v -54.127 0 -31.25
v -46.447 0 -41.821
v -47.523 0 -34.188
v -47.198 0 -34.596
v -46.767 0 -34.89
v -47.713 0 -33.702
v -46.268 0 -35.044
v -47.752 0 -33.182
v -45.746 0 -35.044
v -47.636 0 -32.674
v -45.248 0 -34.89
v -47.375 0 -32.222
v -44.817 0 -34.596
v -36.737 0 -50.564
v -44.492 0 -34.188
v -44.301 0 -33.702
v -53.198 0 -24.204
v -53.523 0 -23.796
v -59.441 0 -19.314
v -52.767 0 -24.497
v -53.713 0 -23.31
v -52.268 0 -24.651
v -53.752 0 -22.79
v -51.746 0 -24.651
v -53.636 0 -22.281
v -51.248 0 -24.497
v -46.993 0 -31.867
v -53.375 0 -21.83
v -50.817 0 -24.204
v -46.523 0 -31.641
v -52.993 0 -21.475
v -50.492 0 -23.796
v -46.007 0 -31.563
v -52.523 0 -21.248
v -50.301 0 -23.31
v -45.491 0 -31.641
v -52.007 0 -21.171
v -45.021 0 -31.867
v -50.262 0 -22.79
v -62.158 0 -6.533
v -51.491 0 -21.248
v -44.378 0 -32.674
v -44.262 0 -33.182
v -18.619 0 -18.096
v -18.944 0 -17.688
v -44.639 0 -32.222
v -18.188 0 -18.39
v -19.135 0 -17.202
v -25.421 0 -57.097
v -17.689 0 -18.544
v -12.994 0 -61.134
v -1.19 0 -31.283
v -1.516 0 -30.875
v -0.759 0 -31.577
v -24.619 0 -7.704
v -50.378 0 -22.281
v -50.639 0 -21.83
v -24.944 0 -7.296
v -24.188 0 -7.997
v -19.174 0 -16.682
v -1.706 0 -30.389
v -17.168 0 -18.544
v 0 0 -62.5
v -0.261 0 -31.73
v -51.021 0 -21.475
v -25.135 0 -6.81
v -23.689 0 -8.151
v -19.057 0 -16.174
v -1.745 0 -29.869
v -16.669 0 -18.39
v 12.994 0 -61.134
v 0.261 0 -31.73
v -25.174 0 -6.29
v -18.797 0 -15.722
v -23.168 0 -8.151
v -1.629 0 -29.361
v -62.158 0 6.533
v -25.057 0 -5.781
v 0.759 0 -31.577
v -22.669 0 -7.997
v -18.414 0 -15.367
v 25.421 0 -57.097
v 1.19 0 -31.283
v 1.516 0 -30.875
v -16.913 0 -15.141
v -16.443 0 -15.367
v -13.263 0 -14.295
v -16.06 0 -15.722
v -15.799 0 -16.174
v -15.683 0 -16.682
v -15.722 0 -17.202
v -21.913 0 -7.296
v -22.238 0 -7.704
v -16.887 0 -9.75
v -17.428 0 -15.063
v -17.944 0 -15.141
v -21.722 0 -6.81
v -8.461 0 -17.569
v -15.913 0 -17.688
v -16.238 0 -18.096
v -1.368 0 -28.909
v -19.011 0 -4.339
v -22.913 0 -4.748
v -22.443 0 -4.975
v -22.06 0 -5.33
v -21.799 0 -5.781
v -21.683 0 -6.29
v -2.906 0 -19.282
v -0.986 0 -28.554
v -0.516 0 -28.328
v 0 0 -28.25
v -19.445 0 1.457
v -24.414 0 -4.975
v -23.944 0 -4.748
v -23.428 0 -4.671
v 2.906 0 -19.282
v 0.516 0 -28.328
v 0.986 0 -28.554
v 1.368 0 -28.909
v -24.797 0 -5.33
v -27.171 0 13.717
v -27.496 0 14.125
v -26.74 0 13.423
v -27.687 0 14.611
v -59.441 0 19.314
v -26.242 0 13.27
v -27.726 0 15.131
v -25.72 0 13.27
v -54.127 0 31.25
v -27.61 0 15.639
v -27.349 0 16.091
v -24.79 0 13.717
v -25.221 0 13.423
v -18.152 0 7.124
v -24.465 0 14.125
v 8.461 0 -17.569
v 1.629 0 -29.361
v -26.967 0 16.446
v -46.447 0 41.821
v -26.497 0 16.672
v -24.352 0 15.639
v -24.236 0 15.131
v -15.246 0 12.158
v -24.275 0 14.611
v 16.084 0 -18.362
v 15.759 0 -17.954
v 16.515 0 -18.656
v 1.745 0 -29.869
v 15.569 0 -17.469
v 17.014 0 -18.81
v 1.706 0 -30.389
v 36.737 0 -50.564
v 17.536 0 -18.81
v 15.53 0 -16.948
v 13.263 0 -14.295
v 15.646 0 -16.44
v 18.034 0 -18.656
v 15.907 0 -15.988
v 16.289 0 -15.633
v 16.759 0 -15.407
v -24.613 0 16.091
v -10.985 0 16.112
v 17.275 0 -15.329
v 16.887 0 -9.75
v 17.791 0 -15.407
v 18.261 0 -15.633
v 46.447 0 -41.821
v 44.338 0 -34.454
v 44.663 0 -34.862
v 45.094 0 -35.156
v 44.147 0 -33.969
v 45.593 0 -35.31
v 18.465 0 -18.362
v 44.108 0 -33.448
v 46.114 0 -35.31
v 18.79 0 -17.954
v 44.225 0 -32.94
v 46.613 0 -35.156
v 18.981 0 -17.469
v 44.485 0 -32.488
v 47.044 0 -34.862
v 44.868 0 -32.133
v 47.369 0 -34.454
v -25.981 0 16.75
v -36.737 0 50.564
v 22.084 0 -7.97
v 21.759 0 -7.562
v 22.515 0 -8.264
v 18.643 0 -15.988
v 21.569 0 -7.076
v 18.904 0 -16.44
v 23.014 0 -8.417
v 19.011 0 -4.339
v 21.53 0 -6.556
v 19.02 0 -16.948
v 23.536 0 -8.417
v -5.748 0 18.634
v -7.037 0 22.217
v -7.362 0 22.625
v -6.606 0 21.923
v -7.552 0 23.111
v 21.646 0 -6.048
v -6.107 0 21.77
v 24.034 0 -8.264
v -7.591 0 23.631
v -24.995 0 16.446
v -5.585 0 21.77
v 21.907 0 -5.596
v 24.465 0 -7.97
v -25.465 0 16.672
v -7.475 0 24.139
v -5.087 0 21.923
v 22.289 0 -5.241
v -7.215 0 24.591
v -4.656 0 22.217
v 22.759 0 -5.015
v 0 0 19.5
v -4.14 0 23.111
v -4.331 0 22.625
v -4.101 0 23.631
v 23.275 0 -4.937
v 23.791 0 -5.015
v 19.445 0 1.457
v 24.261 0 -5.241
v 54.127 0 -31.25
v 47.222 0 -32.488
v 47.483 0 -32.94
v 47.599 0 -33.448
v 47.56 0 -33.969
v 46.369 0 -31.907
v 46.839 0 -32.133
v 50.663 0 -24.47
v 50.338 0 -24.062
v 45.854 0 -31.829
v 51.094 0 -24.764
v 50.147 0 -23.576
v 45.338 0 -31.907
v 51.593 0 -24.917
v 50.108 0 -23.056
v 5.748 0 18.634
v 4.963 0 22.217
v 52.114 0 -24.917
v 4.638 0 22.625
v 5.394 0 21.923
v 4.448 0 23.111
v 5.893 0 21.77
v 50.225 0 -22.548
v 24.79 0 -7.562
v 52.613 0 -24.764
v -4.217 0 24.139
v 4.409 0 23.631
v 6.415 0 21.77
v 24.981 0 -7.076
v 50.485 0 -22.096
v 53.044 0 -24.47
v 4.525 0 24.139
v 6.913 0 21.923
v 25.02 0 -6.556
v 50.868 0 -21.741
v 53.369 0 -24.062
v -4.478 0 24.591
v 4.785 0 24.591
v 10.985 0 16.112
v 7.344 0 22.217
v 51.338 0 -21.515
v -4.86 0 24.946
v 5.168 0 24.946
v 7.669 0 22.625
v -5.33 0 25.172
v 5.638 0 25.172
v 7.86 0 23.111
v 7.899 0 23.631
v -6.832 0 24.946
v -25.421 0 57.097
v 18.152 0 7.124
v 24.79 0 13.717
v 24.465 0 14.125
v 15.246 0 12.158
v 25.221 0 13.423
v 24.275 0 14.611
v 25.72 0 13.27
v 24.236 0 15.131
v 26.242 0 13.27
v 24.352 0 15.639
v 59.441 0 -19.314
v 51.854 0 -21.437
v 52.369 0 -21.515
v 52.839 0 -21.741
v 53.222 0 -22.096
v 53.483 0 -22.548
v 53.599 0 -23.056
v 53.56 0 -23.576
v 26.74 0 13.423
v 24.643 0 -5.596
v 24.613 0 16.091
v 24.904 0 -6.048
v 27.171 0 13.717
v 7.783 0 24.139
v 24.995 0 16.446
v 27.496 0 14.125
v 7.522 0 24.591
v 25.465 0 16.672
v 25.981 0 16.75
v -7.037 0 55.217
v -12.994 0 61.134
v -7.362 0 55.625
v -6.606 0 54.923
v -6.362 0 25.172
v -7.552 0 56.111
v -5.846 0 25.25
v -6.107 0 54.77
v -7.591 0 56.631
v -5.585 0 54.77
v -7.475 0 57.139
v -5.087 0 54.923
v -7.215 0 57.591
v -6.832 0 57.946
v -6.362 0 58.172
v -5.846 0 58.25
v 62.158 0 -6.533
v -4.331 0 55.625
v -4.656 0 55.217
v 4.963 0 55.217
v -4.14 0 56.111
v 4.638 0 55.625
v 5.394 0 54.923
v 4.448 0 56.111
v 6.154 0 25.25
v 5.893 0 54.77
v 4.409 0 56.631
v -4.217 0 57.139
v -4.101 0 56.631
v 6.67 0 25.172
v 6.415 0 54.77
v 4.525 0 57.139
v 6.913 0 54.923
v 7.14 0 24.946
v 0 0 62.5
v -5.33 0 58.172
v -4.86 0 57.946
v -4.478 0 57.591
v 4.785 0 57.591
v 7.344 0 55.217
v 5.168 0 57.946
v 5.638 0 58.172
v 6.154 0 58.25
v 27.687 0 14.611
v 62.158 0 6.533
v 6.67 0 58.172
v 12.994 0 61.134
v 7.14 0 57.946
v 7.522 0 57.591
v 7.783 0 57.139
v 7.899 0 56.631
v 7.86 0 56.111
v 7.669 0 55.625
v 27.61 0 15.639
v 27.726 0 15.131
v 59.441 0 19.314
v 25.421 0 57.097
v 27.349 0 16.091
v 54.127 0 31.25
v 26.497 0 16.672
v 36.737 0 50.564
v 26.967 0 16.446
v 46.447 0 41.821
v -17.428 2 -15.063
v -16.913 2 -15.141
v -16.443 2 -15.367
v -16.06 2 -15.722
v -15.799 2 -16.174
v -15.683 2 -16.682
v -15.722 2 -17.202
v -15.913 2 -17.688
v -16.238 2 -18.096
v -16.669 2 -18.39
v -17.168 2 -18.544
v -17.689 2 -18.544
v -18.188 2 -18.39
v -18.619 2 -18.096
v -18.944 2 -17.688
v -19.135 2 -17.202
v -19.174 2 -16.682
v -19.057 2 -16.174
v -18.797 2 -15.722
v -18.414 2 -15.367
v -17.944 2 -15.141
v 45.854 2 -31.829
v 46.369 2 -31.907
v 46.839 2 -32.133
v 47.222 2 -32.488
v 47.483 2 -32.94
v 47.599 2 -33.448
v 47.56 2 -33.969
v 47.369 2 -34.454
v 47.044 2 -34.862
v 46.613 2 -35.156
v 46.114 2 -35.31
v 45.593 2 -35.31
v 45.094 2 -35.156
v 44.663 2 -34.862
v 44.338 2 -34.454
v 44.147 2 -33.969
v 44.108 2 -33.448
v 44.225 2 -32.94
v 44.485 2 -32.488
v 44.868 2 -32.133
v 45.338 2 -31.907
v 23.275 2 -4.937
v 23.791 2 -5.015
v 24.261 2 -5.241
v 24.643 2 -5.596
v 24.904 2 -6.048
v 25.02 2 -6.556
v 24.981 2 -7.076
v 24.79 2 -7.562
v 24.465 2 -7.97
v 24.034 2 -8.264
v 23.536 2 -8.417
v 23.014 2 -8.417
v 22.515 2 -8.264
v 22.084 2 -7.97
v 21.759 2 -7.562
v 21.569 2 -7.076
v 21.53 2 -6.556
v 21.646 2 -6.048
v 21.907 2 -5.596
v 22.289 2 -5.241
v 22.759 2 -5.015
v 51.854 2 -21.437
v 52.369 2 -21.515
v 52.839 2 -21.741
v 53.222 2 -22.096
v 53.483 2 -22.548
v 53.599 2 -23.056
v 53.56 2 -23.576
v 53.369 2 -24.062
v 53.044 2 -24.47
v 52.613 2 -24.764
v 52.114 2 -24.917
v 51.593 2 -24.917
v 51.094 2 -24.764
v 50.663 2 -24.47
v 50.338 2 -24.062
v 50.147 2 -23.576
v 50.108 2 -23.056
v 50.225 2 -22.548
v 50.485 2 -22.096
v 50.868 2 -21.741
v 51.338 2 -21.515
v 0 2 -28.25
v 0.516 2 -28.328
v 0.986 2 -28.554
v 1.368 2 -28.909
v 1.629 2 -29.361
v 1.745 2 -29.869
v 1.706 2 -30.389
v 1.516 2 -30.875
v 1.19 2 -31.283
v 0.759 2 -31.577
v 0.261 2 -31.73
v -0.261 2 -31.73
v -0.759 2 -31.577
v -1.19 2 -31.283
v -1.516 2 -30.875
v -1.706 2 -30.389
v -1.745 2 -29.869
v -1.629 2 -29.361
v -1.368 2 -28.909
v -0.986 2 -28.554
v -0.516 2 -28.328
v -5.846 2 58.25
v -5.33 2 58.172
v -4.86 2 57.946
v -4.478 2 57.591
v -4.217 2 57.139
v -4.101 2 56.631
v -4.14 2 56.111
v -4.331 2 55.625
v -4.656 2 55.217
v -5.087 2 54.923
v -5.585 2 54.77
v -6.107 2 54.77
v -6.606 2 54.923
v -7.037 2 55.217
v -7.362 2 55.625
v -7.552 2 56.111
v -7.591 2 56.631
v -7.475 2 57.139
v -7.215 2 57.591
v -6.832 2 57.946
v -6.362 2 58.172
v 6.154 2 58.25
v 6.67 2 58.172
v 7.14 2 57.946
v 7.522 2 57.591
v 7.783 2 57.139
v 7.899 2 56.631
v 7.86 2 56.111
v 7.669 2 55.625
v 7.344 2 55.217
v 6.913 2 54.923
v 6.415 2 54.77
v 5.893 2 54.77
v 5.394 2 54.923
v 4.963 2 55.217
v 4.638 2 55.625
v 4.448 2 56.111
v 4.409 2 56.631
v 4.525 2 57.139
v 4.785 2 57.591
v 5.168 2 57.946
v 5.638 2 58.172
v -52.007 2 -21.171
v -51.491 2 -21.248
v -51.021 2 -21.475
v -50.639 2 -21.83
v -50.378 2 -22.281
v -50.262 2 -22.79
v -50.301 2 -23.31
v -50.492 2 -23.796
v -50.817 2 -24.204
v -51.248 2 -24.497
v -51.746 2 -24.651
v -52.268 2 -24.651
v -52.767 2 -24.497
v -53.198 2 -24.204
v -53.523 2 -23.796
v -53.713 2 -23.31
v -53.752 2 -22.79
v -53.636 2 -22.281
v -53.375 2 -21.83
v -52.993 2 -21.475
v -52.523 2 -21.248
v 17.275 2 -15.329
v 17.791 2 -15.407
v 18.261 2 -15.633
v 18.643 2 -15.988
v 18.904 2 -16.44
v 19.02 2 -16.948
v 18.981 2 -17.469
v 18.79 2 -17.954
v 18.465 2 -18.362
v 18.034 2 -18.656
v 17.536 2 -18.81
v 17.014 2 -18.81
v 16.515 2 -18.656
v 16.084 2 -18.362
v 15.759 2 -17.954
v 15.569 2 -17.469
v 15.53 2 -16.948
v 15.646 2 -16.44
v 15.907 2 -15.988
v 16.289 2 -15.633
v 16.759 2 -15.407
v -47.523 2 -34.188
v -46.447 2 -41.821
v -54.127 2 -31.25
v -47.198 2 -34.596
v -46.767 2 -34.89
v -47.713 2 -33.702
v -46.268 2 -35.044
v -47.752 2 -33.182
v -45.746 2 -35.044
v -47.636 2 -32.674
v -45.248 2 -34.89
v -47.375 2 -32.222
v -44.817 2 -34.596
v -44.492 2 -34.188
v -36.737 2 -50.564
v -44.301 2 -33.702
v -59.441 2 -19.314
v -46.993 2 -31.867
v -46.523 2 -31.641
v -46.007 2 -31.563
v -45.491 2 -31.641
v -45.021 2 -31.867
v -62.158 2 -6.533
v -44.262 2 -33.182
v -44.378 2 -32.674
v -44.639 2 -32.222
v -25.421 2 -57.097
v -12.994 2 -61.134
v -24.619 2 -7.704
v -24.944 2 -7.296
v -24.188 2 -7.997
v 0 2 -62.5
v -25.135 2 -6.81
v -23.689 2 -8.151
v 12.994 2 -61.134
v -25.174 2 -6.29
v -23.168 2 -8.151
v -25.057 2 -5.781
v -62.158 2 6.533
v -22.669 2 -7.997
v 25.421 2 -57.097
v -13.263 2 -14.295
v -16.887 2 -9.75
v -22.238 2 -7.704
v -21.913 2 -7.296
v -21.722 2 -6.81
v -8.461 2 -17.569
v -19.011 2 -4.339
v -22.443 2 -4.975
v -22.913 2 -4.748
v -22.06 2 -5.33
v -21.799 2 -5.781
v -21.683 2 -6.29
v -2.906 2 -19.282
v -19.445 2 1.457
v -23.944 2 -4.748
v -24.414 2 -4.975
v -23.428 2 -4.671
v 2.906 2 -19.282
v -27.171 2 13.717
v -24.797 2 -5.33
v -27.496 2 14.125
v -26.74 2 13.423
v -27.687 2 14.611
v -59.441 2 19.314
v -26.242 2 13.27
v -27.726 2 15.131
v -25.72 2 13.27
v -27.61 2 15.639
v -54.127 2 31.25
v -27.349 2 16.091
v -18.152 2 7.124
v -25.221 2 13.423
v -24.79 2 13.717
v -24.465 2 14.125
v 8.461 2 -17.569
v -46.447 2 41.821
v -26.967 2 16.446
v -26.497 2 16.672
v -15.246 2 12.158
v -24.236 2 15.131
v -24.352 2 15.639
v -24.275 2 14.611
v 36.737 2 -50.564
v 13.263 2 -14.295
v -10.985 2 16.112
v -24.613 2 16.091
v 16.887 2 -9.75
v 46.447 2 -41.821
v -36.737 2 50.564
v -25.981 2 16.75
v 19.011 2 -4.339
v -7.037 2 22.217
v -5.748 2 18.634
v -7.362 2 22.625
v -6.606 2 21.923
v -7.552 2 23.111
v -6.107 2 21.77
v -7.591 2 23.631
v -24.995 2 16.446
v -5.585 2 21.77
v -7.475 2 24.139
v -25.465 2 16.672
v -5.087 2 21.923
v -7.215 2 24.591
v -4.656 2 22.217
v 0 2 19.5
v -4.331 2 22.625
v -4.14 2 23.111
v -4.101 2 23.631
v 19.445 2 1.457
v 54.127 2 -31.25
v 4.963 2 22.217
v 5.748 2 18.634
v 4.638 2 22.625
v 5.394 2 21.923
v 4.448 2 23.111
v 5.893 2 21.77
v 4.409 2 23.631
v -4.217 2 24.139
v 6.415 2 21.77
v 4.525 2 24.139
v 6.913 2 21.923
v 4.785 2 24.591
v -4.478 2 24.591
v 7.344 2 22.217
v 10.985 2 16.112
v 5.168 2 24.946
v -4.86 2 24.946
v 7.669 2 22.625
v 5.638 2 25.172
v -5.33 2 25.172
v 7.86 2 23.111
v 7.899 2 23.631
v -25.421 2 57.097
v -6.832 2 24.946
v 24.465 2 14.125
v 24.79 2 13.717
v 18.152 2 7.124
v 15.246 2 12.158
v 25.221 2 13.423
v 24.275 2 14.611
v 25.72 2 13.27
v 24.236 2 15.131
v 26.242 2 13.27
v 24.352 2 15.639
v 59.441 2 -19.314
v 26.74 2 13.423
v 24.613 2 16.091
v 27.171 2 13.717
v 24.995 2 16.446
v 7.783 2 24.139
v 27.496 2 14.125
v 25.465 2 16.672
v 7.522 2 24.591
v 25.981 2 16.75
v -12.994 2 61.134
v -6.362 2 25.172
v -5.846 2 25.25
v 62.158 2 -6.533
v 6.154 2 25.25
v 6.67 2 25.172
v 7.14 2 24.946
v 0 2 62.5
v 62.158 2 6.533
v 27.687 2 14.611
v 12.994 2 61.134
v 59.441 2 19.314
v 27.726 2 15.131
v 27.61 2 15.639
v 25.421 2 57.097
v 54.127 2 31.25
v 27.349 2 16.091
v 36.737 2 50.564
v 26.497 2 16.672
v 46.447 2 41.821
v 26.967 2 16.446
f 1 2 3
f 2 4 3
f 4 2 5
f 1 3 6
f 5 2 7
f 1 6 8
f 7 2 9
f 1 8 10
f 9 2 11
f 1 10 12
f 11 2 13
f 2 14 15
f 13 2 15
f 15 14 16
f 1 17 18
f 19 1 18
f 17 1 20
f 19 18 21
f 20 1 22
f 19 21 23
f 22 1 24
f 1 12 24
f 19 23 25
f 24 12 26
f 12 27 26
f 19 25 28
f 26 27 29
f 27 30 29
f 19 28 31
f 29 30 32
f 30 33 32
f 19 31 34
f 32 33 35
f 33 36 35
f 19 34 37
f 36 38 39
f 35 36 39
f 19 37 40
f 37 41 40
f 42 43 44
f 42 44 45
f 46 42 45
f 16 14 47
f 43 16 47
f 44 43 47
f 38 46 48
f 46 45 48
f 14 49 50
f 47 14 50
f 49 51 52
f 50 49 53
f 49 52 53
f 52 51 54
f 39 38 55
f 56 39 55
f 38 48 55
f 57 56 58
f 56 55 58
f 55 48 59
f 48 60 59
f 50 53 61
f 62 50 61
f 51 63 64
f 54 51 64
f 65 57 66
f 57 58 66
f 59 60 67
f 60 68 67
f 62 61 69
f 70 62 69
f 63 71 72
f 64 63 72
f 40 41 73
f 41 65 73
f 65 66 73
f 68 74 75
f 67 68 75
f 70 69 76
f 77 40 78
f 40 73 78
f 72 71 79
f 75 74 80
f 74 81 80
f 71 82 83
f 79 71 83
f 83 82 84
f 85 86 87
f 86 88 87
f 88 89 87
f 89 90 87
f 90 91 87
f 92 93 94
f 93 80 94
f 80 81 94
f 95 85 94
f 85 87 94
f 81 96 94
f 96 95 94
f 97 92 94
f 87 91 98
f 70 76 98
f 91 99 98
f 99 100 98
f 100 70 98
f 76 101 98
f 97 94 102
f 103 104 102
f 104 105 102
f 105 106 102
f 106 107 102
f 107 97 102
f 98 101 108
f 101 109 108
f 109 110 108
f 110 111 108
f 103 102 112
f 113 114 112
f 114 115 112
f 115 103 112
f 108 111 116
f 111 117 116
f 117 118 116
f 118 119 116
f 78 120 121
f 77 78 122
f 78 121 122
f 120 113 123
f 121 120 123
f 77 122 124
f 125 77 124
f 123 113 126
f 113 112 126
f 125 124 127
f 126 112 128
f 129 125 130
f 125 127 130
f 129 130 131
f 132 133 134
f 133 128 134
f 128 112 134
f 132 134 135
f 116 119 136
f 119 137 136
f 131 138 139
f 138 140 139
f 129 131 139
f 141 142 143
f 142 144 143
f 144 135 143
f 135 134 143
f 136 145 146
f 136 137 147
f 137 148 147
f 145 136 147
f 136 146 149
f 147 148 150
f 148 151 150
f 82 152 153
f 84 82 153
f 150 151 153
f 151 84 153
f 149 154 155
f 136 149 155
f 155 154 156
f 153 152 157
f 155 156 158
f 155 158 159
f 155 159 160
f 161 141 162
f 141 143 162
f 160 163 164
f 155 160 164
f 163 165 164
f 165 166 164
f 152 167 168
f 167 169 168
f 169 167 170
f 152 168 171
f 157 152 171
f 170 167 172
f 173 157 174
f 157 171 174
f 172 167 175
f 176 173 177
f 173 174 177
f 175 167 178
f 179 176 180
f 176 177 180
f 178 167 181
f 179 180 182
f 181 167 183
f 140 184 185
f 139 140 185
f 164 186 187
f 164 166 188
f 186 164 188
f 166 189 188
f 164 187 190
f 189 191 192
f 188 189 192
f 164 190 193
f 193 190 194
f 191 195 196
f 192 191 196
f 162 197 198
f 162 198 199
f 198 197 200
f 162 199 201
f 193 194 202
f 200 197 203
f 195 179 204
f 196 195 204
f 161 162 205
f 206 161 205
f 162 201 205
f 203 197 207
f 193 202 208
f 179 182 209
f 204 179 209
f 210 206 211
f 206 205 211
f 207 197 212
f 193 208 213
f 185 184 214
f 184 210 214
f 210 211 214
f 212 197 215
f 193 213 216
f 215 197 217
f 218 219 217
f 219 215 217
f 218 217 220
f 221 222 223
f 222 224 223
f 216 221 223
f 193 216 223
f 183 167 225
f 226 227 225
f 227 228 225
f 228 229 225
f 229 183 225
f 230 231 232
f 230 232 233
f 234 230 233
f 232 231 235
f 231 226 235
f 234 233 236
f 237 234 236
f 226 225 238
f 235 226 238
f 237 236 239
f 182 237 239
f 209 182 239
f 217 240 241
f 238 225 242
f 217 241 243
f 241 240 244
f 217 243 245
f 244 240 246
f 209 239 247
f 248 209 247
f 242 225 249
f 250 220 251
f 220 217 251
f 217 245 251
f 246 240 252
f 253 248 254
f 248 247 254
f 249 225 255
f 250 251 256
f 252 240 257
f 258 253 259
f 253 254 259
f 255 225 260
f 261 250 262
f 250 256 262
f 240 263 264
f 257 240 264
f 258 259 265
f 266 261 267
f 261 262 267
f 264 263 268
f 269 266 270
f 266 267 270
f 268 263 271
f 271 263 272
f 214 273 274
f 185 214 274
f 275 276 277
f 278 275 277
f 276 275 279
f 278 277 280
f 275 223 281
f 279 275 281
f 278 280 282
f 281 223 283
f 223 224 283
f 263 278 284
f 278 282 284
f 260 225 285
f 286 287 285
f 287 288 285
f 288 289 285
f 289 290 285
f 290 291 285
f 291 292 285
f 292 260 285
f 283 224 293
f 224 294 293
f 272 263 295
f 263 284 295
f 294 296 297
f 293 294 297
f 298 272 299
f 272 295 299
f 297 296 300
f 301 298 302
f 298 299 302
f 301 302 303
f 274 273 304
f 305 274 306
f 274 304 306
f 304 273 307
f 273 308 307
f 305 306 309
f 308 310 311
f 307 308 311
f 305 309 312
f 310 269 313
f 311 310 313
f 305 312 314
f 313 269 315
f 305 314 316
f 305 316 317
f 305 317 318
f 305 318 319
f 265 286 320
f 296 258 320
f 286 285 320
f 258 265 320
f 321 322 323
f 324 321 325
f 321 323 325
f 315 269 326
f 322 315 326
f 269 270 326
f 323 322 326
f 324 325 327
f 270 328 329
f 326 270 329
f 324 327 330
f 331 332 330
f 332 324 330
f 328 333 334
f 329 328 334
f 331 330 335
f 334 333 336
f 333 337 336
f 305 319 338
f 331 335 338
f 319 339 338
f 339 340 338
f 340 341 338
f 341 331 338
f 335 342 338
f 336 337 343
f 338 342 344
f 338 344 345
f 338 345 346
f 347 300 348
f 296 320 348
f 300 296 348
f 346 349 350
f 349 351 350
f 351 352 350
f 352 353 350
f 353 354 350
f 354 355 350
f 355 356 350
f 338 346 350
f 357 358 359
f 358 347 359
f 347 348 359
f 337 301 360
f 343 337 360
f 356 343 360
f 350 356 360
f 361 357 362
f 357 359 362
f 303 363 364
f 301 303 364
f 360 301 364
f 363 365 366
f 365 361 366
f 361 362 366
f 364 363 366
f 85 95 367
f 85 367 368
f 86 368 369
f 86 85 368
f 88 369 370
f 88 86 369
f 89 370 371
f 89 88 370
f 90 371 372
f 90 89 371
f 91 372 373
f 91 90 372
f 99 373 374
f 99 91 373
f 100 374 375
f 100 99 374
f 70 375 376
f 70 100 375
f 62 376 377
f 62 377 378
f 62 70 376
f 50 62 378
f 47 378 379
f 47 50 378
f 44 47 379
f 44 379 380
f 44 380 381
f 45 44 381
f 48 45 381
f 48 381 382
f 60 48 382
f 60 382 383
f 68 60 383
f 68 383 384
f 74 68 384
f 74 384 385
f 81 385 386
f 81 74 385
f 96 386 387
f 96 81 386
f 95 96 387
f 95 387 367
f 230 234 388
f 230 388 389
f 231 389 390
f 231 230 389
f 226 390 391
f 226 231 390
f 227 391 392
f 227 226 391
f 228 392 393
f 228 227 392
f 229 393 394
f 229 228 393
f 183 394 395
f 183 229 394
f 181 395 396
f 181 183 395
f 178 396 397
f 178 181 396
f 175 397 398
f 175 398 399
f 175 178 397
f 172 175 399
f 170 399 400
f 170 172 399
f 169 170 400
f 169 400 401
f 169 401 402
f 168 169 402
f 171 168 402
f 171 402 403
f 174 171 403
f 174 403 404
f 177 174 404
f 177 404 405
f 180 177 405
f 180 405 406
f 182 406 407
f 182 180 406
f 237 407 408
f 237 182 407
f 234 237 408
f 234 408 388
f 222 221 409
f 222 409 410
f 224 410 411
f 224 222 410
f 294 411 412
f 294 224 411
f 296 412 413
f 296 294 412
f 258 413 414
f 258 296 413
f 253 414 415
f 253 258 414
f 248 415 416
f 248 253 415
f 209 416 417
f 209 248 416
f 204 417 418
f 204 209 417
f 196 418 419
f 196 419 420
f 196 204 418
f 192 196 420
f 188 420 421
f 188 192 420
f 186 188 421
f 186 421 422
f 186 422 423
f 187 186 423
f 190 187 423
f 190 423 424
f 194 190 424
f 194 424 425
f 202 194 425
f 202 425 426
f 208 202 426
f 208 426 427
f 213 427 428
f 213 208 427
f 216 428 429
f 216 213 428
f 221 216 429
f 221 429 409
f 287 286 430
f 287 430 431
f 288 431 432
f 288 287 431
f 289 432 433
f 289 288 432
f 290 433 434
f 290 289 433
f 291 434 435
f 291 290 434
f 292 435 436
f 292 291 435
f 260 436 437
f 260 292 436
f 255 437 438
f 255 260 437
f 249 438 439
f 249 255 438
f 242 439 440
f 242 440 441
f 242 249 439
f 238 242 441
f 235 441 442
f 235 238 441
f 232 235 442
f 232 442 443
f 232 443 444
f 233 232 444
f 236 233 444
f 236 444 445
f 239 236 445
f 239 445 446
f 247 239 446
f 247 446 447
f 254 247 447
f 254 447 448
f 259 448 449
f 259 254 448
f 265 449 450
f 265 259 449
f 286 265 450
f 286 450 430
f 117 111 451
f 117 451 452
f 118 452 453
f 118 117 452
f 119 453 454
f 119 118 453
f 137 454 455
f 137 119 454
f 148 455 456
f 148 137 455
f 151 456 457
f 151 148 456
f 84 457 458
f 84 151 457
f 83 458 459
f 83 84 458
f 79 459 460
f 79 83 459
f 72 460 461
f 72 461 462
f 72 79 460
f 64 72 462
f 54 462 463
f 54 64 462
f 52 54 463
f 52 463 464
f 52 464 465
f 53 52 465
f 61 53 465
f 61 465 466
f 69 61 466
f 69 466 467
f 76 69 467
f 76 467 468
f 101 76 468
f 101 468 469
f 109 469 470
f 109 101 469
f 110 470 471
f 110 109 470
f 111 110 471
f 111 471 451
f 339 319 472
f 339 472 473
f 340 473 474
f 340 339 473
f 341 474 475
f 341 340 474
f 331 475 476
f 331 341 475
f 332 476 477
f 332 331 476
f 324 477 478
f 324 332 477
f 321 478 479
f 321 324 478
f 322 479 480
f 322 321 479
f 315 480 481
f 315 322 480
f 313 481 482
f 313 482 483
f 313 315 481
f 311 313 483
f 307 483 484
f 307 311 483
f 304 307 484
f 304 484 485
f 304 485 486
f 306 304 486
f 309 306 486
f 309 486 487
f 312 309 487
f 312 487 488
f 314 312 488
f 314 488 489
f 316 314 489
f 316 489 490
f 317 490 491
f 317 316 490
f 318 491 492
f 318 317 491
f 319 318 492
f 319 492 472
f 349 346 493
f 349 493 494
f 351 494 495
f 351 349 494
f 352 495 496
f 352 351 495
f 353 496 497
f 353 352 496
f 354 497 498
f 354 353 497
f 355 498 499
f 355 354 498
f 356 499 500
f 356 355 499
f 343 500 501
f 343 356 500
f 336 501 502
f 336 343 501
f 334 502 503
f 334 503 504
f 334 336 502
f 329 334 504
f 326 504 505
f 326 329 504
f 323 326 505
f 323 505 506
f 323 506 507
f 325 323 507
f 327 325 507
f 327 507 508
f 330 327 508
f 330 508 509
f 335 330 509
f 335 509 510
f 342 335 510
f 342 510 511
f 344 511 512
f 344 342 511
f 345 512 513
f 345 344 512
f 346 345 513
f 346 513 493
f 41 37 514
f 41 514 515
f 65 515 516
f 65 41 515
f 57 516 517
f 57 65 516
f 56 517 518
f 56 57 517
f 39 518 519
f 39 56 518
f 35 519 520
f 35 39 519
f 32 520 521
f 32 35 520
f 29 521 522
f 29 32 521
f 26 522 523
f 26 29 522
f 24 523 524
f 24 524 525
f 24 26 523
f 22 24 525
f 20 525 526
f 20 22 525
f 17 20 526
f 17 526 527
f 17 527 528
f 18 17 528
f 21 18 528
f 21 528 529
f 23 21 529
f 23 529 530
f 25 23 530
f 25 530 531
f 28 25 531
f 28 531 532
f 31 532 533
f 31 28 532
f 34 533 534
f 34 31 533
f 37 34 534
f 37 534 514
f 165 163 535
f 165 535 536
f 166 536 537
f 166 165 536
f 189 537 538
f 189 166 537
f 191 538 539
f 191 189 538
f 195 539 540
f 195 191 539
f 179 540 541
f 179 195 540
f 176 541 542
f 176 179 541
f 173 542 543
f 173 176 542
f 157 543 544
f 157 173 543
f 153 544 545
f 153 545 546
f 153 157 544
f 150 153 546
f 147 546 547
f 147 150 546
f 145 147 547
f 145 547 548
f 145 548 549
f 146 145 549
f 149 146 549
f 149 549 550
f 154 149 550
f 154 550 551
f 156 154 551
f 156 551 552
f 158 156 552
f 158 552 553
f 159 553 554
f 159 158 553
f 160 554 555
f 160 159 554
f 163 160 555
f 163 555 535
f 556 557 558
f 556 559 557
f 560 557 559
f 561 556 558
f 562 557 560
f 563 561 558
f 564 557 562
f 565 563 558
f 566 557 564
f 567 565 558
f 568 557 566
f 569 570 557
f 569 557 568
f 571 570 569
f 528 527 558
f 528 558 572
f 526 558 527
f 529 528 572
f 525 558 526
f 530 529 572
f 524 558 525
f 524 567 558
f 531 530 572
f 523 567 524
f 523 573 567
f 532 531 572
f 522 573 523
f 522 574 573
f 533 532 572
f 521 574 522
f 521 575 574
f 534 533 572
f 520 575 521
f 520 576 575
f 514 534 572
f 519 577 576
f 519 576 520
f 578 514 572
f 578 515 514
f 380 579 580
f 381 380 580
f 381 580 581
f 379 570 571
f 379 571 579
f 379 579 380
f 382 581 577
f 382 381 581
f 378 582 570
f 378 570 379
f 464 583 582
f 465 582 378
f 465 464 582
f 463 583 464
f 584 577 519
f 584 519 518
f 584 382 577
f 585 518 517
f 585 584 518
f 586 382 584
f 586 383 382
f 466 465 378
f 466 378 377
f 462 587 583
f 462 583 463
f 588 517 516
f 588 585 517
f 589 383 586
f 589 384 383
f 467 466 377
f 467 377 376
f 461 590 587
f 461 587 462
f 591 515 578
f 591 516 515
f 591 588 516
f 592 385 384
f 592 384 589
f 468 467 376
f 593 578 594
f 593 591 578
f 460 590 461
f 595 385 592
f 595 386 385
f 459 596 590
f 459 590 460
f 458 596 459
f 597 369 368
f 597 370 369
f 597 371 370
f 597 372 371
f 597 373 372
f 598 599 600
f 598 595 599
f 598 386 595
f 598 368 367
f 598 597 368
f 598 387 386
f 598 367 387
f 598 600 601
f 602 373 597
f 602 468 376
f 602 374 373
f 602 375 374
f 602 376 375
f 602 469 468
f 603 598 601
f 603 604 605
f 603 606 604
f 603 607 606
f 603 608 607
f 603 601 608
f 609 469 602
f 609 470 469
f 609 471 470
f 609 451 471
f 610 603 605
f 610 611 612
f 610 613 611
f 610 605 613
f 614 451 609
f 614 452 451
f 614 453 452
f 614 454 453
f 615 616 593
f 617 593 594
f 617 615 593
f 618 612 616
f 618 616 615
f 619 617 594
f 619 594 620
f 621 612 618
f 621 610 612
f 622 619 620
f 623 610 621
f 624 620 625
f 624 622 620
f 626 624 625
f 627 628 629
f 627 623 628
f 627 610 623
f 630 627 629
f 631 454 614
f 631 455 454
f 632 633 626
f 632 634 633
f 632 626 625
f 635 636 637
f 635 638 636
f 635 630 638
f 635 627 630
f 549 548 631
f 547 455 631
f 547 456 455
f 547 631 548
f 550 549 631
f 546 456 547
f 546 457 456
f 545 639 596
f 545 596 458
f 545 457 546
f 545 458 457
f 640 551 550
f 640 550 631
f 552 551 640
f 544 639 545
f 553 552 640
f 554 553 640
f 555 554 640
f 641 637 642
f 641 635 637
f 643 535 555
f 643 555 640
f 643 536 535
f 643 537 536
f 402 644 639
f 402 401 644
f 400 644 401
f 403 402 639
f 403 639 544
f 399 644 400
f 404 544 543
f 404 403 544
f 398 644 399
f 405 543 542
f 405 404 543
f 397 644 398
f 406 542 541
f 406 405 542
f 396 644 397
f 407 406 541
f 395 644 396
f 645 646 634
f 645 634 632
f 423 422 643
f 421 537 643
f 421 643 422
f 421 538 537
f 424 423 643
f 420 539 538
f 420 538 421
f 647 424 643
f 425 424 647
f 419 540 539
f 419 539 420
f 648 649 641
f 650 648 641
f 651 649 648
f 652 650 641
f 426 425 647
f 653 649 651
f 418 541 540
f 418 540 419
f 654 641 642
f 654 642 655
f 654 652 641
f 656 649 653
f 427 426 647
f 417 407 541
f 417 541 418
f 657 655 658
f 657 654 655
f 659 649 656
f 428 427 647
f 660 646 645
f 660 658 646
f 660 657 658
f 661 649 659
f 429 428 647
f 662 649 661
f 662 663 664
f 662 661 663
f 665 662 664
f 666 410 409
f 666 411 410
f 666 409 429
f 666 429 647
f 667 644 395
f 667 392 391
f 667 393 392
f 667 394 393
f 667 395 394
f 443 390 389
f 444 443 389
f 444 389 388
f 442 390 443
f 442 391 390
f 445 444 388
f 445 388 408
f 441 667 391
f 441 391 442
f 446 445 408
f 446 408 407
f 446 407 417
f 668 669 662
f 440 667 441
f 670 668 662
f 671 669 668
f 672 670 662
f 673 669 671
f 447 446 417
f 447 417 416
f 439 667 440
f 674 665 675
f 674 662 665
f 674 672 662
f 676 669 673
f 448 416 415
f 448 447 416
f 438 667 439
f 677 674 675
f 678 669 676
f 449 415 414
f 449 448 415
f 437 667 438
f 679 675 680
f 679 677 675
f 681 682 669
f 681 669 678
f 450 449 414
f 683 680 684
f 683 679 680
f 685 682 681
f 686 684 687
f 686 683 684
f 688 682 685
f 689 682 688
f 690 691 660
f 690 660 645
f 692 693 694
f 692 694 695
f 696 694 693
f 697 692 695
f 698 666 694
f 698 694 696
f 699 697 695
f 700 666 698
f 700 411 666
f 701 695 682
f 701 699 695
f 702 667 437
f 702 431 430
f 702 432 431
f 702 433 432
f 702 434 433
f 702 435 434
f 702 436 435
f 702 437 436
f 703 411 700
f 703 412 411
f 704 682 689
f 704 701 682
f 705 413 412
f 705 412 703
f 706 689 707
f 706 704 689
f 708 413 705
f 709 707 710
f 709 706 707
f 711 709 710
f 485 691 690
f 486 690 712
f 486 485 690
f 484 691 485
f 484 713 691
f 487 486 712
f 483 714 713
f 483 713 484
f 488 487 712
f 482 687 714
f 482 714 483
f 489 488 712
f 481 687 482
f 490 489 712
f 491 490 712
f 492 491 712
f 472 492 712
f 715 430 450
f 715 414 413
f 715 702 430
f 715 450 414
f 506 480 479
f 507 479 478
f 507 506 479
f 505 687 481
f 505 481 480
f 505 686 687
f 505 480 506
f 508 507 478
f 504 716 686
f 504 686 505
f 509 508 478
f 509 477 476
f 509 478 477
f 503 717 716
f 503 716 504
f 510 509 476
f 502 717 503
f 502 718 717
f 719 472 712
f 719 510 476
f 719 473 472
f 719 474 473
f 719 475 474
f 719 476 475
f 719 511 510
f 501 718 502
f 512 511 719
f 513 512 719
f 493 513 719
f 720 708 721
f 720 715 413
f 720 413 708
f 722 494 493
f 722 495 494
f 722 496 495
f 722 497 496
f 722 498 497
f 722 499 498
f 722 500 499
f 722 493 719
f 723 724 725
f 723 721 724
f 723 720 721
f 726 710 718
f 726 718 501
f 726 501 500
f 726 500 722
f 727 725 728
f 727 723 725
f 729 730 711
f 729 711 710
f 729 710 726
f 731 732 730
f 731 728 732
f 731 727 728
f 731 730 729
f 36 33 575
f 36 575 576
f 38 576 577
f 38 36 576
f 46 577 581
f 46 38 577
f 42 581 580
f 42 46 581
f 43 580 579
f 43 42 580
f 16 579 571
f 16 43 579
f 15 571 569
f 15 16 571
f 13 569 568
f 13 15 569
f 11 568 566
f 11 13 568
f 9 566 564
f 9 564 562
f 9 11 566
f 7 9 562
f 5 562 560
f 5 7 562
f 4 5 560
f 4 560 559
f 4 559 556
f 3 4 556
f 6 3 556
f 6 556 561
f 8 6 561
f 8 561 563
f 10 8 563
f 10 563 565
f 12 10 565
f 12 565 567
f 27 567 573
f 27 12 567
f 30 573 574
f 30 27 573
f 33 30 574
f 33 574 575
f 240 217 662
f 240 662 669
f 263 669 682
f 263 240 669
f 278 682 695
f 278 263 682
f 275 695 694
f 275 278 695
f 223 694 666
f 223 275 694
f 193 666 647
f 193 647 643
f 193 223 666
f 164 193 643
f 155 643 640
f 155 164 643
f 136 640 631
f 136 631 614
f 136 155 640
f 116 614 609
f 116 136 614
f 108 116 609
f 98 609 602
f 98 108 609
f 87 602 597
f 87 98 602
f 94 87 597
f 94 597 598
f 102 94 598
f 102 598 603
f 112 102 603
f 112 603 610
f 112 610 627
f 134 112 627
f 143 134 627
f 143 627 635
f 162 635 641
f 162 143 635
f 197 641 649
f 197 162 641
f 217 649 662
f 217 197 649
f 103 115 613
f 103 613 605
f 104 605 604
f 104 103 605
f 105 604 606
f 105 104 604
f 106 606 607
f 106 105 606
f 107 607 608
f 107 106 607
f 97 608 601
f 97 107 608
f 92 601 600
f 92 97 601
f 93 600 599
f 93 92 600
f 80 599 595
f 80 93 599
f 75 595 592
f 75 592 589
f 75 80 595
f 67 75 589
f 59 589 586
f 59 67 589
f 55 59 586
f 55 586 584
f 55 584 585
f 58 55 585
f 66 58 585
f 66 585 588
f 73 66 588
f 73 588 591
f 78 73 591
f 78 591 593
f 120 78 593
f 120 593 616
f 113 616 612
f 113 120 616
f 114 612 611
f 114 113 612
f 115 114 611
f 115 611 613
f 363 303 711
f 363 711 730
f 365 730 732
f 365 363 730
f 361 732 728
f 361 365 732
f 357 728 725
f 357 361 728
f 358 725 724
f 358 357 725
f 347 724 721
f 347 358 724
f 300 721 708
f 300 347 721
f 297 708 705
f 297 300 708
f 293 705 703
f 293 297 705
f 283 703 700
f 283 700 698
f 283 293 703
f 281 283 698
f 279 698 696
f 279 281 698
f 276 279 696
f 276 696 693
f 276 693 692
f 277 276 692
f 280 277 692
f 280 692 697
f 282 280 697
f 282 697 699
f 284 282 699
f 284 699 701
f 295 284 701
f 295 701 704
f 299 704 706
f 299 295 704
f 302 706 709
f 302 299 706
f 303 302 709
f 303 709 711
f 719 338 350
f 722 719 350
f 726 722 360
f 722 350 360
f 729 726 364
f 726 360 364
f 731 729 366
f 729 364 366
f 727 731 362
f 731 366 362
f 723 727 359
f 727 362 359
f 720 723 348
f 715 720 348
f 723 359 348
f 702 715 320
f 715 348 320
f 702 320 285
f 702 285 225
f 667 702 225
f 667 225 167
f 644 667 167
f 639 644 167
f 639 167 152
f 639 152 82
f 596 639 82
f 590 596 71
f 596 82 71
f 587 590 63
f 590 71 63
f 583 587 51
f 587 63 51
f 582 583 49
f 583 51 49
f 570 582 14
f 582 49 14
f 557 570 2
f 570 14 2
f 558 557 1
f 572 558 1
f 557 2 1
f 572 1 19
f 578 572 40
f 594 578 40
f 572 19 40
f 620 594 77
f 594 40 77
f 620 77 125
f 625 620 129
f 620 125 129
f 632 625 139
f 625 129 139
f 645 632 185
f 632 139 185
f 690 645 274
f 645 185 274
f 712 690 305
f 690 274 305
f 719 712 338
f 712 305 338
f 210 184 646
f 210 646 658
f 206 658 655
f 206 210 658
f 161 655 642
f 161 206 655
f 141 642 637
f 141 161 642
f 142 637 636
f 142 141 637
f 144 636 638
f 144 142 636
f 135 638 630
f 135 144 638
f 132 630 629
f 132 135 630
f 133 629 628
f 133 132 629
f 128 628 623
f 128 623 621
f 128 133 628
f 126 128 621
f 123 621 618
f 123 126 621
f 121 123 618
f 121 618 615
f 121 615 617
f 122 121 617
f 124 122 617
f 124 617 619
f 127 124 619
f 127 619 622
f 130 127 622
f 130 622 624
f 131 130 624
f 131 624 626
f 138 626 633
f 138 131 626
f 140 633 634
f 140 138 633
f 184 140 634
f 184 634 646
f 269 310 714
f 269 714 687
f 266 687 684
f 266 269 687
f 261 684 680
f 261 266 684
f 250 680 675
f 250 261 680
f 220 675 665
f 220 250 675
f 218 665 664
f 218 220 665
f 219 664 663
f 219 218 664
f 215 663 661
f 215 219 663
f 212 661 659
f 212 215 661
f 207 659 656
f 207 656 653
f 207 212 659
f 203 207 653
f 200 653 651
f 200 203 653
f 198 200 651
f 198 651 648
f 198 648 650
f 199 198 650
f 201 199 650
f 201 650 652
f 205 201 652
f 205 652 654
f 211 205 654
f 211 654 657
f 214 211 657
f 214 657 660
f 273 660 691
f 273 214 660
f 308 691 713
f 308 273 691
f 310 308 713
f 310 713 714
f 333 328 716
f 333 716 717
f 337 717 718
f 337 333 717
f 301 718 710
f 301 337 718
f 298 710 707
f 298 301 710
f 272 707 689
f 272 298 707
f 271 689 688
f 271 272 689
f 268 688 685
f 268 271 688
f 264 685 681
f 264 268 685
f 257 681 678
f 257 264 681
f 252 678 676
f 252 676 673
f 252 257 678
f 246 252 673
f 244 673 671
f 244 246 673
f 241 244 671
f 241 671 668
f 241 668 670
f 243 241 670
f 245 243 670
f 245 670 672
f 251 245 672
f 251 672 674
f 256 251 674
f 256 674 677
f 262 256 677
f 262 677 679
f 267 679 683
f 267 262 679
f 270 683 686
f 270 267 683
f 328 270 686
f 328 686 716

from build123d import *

# Parameters (mm, degrees)
SKETCH1_R           = 62.5
SKETCH1_R_2         = 1.75
SKETCH1_R_3         = 19.5
BOSS_EXTRUDE1_DEPTH = 2


with BuildPart() as part:
    # Sketch1 → Boss-Extrude1 (new body)
    with BuildSketch(Plane(origin=(0, 0, 0), x_dir=(1, 0, 0), z_dir=(0, 1, 0))):
        with Locations(Location((0, 0, 0), (0, 0, 270))):
            Circle(SKETCH1_R)
        with Locations(Location((6.153691309, -23.5, 0), (0, 0, 270))):
            Circle(SKETCH1_R_2, mode=Mode.SUBTRACT)
        with Locations(Location((-5.846308691, -23.5, 0), (0, 0, 270))):
            Circle(SKETCH1_R_2, mode=Mode.SUBTRACT)
        with Locations(Location((6.153691309, -56.5, 0), (0, 0, 270))):
            Circle(SKETCH1_R_2, mode=Mode.SUBTRACT)
        with Locations(Location((-5.846308691, -56.5, 0), (0, 0, 270))):
            Circle(SKETCH1_R_2, mode=Mode.SUBTRACT)
        with Locations(Location((-46.007280968, 33.313051845, 0), (0, 0, 270))):
            Circle(SKETCH1_R_2, mode=Mode.SUBTRACT)
        with Locations(Location((-23.428442643, 6.420747, 0), (0, 0, 270))):
            Circle(SKETCH1_R_2, mode=Mode.SUBTRACT)
        with Locations(Location((-17.428442643, 16.813051845, 0), (0, 0, 270))):
            Circle(SKETCH1_R_2, mode=Mode.SUBTRACT)
        with Locations(Location((-52.007280968, 22.920747, 0), (0, 0, 270))):
            Circle(SKETCH1_R_2, mode=Mode.SUBTRACT)
        with Locations(Location((51.853589659, 23.186948155, 0), (0, 0, 270))):
            Circle(SKETCH1_R_2, mode=Mode.SUBTRACT)
        with Locations(Location((17.274751335, 17.079253, 0), (0, 0, 270))):
            Circle(SKETCH1_R_2, mode=Mode.SUBTRACT)
        with Locations(Location((23.274751335, 6.686948155, 0), (0, 0, 270))):
            Circle(SKETCH1_R_2, mode=Mode.SUBTRACT)
        with Locations(Location((45.853589659, 33.579253, 0), (0, 0, 270))):
            Circle(SKETCH1_R_2, mode=Mode.SUBTRACT)
        with Locations(Location((0, 0, 0), (0, 0, 270))):
            Circle(SKETCH1_R_3, mode=Mode.SUBTRACT)
        with Locations(Location((0, 30, 0), (0, 0, 270))):
            Circle(SKETCH1_R_2, mode=Mode.SUBTRACT)
        with Locations(Location((25.980762114, -15, 0), (0, 0, 270))):
            Circle(SKETCH1_R_2, mode=Mode.SUBTRACT)
        with Locations(Location((-25.980762114, -15, 0), (0, 0, 270))):
            Circle(SKETCH1_R_2, mode=Mode.SUBTRACT)
    extrude(amount=BOSS_EXTRUDE1_DEPTH)


solid = part.part
